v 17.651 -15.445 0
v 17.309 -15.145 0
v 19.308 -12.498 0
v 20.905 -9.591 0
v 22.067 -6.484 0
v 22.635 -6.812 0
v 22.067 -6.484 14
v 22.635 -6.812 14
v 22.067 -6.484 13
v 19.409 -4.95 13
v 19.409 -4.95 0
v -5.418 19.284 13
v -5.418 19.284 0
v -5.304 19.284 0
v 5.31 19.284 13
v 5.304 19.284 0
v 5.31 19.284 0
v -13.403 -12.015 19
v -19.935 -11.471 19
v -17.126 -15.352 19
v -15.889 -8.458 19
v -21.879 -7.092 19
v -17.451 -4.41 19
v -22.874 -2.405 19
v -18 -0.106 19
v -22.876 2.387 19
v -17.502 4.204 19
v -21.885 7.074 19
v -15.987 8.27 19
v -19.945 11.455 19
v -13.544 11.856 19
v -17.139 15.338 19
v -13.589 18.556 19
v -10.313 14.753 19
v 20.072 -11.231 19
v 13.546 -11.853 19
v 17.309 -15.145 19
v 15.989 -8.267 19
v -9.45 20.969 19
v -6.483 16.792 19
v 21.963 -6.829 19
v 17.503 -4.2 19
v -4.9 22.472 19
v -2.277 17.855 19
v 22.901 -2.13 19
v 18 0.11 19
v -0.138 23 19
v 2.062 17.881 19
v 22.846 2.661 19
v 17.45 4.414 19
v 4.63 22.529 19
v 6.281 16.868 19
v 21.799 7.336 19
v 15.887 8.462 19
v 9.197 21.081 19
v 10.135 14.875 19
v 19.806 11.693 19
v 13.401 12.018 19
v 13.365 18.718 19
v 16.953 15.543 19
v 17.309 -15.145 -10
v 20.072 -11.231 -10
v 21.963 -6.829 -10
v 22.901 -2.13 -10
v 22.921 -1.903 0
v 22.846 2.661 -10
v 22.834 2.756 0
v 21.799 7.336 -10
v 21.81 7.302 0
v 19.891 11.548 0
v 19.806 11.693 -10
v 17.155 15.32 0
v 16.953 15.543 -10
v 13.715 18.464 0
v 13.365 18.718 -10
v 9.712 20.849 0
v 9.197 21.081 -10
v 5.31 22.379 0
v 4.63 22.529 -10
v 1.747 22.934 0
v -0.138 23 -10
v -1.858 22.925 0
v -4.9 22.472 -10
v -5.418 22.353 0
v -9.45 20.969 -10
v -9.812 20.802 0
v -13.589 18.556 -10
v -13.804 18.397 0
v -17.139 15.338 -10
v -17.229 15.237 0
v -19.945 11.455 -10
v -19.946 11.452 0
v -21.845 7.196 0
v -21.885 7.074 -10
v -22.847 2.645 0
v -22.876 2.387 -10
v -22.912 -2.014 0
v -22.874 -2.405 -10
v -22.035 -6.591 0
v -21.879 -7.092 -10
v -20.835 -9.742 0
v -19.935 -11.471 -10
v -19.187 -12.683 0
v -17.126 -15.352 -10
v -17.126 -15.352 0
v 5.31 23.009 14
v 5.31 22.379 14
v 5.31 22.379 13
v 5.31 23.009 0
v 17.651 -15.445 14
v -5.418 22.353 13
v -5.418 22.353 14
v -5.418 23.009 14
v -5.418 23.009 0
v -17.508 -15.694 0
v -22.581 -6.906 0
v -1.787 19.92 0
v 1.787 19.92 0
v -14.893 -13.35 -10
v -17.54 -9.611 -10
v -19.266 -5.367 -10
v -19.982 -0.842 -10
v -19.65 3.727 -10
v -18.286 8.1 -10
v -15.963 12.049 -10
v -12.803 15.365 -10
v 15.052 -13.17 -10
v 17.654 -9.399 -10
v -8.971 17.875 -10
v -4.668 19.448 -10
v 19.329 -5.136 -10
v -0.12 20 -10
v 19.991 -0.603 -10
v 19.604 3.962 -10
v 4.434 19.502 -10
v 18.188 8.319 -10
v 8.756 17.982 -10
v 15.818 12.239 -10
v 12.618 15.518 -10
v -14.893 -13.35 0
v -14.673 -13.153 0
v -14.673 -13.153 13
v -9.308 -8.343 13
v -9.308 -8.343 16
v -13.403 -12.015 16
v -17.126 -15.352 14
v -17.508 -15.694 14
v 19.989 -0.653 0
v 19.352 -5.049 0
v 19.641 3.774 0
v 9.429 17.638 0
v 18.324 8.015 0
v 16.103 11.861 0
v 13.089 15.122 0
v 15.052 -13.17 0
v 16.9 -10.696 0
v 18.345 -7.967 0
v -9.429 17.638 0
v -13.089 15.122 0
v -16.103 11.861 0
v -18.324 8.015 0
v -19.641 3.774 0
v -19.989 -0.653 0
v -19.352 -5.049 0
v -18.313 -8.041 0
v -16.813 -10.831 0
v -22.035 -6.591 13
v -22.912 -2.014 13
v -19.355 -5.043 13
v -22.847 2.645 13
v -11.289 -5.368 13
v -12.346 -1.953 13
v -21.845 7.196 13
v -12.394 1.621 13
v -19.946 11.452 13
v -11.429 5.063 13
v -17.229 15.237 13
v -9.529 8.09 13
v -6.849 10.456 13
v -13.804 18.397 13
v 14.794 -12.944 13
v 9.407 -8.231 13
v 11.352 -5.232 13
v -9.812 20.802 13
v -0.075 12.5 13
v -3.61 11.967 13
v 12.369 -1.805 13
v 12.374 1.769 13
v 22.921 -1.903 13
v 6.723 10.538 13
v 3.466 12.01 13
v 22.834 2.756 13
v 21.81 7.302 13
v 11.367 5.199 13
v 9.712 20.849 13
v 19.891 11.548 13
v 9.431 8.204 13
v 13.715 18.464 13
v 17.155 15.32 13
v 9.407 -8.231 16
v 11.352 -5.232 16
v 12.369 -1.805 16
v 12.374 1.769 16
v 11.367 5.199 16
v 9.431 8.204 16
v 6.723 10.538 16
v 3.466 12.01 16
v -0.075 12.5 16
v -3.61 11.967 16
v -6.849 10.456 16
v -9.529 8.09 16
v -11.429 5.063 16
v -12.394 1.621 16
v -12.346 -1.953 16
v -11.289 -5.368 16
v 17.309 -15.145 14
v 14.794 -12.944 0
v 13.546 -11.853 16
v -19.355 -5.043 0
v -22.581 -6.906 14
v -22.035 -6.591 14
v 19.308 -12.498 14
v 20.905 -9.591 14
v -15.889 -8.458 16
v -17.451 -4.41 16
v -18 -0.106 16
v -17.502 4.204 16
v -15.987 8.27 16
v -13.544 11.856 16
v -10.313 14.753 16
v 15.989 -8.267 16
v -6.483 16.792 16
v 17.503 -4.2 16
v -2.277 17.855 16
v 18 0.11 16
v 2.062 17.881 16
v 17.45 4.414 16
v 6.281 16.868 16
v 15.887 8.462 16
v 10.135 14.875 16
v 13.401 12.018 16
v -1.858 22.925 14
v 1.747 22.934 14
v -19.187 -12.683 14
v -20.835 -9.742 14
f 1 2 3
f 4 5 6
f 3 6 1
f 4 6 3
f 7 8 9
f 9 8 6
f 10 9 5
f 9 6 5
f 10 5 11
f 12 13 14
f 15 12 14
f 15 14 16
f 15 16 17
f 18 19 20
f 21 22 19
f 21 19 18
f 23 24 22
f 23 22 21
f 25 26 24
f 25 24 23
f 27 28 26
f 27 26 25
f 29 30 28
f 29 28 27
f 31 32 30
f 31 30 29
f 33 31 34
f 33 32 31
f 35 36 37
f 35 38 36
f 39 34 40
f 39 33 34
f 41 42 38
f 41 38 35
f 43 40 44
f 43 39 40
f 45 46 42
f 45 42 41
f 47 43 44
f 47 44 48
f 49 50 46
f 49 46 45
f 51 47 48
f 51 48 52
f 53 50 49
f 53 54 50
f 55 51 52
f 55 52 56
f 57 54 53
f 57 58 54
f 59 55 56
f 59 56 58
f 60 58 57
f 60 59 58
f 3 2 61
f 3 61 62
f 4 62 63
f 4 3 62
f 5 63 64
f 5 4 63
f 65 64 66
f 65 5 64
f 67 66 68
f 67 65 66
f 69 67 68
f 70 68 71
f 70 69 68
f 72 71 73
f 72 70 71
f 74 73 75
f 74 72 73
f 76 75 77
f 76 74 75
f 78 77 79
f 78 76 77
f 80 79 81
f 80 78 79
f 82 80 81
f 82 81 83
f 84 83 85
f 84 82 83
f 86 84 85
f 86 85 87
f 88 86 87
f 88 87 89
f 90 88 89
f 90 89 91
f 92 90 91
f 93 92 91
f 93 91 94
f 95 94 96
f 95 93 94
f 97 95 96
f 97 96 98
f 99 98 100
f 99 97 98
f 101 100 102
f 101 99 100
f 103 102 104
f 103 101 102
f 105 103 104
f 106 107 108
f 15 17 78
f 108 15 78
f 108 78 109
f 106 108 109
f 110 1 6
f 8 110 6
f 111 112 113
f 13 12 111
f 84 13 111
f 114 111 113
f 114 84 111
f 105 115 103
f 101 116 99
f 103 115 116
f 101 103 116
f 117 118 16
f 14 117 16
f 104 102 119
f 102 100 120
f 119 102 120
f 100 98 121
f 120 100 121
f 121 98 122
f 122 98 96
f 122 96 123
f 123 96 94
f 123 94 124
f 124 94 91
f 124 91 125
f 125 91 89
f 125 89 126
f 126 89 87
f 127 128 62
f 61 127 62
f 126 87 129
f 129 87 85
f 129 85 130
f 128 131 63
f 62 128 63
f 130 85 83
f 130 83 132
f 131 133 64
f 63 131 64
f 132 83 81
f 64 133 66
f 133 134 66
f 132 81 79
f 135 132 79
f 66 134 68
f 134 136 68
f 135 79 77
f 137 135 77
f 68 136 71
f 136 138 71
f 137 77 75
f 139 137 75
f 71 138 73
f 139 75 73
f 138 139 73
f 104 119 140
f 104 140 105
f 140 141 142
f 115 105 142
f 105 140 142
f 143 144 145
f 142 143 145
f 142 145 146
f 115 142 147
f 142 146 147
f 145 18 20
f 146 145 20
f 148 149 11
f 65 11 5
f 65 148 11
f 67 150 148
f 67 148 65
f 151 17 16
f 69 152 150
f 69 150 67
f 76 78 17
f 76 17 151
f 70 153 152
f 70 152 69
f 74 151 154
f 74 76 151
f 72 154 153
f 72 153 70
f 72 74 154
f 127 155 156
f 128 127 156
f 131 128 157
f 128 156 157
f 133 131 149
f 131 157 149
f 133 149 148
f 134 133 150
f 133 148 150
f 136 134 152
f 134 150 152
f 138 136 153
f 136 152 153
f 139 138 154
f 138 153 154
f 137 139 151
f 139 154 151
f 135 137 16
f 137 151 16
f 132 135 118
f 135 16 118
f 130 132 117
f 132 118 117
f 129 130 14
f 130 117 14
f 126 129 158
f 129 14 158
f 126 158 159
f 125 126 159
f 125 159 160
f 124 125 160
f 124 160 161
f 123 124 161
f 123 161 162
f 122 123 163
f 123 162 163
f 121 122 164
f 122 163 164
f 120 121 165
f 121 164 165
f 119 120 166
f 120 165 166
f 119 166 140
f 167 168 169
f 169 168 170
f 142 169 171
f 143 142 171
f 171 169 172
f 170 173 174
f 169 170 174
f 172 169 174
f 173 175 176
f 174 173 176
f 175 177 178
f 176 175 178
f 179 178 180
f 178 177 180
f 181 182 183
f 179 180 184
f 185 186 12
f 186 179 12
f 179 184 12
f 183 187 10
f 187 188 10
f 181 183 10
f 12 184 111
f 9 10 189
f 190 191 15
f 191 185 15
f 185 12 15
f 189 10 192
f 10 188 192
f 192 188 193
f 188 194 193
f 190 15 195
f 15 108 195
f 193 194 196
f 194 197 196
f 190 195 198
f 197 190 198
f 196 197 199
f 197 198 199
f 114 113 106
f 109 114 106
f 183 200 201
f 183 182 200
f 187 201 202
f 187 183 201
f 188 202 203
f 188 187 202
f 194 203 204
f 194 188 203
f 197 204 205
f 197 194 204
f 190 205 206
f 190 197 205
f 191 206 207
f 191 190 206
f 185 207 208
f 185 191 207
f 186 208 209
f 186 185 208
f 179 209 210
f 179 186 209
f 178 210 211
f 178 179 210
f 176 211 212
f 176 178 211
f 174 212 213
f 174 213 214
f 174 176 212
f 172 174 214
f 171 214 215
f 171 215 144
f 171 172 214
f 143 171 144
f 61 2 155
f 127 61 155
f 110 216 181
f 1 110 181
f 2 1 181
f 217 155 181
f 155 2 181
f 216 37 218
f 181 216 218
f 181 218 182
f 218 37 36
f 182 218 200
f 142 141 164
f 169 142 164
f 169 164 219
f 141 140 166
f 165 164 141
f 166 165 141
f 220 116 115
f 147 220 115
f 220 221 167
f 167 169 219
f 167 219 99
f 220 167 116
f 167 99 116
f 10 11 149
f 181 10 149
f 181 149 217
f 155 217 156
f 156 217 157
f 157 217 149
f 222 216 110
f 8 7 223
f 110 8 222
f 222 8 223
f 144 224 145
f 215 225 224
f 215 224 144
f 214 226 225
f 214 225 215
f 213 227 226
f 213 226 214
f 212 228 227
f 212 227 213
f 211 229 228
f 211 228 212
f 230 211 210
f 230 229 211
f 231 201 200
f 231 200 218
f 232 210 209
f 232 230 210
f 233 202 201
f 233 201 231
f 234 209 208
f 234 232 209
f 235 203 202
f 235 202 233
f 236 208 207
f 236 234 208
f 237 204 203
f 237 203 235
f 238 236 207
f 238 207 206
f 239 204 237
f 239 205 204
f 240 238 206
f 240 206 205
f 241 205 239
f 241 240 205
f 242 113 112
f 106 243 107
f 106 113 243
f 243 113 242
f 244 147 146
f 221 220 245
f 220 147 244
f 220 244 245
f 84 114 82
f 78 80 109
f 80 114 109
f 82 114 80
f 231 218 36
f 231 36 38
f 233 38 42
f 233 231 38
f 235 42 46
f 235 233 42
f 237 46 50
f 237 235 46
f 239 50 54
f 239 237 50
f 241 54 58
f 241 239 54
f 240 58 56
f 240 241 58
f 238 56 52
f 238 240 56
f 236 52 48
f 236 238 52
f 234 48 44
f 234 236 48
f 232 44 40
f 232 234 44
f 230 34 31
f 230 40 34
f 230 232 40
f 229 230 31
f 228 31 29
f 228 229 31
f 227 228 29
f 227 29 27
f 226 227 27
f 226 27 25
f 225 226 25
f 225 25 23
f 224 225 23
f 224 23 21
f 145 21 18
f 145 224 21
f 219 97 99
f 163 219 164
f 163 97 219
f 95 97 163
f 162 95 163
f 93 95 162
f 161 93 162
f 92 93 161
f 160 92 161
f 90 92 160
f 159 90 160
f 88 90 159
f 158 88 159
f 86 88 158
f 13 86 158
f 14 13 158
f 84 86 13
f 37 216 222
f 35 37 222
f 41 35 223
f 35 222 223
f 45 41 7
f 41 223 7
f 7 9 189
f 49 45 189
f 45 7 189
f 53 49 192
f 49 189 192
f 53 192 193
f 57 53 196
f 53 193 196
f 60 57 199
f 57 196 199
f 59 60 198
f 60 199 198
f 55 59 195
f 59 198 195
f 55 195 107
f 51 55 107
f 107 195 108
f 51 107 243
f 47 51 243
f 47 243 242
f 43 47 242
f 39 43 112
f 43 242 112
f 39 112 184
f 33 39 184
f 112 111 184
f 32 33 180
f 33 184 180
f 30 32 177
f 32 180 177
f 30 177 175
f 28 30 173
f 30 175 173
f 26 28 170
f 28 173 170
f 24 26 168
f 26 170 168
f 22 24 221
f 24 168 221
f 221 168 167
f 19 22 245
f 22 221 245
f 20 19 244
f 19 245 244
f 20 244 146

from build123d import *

# Parameters (mm, degrees)
F0_R      = 23
F0_R_2    = 20
F1_DEPTH  = 10
F3_R      = 23
F3_R_2    = 18
F4_DEPTH  = 6
F5_R      = 23
F5_R_2    = 12.5
F6_DEPTH  = 3
F7_W      = 10.728056
F7_H      = 3.725031
F8_DEPTH  = 14
F10_DEPTH = 20


with BuildPart() as f1:
    # F0 (on Top) → F1 (new body)
    with BuildSketch(Plane.XY):
        Circle(F0_R)
        Circle(F0_R_2, mode=Mode.SUBTRACT)
    extrude(amount=-F1_DEPTH)



with BuildPart() as f4:
    # F3 (on offset) → F4 (new body)
    with BuildSketch(Plane.XY.offset(13)):
        Circle(F3_R)
        Circle(F3_R_2, mode=Mode.SUBTRACT)
    extrude(amount=F4_DEPTH)


with BuildPart() as f6:
    # F5 (on offset) → F6 (new body)
    with BuildSketch(Plane.XY.offset(13)):
        Circle(F5_R)
        Circle(F5_R_2, mode=Mode.SUBTRACT)
    extrude(amount=F6_DEPTH)


with BuildPart() as f1_1:
    add(f1.part)

    add(f4.part)  # F8 merges F4

    add(f6.part)  # F8 merges F6
    # F7 (on Top) → F8 (join)
    with BuildSketch(Plane.XY):
        with Locations((-0.054133, 21.146403)):
            Rectangle(F7_W, F7_H)
        Polygon((-22.581255, -6.905955), (-17.217227, -16.196724), (-13.991256, -14.334209), (-19.355284, -5.043439), align=None)
        Polygon((17.27136, -16.102963), (22.635388, -6.812194), (19.409416, -4.949678), (14.045388, -14.240448), align=None)
    extrude(amount=F8_DEPTH)


with BuildPart() as f10:
    # F9 (on Top) → F10 (new body, symmetric)
    with BuildSketch(Plane.XY):
        Polygon((20.578749, -18.006055), (0, 0), (-19.199688, -17.210485), (0.803183, -30.16689), align=None)
    extrude(amount=F10_DEPTH, both=True)


with BuildPart() as f1_2:
    add(f1_1.part)

    # F11: cut F10
    add(f10.part, mode=Mode.SUBTRACT)


solid = f1_2.part
